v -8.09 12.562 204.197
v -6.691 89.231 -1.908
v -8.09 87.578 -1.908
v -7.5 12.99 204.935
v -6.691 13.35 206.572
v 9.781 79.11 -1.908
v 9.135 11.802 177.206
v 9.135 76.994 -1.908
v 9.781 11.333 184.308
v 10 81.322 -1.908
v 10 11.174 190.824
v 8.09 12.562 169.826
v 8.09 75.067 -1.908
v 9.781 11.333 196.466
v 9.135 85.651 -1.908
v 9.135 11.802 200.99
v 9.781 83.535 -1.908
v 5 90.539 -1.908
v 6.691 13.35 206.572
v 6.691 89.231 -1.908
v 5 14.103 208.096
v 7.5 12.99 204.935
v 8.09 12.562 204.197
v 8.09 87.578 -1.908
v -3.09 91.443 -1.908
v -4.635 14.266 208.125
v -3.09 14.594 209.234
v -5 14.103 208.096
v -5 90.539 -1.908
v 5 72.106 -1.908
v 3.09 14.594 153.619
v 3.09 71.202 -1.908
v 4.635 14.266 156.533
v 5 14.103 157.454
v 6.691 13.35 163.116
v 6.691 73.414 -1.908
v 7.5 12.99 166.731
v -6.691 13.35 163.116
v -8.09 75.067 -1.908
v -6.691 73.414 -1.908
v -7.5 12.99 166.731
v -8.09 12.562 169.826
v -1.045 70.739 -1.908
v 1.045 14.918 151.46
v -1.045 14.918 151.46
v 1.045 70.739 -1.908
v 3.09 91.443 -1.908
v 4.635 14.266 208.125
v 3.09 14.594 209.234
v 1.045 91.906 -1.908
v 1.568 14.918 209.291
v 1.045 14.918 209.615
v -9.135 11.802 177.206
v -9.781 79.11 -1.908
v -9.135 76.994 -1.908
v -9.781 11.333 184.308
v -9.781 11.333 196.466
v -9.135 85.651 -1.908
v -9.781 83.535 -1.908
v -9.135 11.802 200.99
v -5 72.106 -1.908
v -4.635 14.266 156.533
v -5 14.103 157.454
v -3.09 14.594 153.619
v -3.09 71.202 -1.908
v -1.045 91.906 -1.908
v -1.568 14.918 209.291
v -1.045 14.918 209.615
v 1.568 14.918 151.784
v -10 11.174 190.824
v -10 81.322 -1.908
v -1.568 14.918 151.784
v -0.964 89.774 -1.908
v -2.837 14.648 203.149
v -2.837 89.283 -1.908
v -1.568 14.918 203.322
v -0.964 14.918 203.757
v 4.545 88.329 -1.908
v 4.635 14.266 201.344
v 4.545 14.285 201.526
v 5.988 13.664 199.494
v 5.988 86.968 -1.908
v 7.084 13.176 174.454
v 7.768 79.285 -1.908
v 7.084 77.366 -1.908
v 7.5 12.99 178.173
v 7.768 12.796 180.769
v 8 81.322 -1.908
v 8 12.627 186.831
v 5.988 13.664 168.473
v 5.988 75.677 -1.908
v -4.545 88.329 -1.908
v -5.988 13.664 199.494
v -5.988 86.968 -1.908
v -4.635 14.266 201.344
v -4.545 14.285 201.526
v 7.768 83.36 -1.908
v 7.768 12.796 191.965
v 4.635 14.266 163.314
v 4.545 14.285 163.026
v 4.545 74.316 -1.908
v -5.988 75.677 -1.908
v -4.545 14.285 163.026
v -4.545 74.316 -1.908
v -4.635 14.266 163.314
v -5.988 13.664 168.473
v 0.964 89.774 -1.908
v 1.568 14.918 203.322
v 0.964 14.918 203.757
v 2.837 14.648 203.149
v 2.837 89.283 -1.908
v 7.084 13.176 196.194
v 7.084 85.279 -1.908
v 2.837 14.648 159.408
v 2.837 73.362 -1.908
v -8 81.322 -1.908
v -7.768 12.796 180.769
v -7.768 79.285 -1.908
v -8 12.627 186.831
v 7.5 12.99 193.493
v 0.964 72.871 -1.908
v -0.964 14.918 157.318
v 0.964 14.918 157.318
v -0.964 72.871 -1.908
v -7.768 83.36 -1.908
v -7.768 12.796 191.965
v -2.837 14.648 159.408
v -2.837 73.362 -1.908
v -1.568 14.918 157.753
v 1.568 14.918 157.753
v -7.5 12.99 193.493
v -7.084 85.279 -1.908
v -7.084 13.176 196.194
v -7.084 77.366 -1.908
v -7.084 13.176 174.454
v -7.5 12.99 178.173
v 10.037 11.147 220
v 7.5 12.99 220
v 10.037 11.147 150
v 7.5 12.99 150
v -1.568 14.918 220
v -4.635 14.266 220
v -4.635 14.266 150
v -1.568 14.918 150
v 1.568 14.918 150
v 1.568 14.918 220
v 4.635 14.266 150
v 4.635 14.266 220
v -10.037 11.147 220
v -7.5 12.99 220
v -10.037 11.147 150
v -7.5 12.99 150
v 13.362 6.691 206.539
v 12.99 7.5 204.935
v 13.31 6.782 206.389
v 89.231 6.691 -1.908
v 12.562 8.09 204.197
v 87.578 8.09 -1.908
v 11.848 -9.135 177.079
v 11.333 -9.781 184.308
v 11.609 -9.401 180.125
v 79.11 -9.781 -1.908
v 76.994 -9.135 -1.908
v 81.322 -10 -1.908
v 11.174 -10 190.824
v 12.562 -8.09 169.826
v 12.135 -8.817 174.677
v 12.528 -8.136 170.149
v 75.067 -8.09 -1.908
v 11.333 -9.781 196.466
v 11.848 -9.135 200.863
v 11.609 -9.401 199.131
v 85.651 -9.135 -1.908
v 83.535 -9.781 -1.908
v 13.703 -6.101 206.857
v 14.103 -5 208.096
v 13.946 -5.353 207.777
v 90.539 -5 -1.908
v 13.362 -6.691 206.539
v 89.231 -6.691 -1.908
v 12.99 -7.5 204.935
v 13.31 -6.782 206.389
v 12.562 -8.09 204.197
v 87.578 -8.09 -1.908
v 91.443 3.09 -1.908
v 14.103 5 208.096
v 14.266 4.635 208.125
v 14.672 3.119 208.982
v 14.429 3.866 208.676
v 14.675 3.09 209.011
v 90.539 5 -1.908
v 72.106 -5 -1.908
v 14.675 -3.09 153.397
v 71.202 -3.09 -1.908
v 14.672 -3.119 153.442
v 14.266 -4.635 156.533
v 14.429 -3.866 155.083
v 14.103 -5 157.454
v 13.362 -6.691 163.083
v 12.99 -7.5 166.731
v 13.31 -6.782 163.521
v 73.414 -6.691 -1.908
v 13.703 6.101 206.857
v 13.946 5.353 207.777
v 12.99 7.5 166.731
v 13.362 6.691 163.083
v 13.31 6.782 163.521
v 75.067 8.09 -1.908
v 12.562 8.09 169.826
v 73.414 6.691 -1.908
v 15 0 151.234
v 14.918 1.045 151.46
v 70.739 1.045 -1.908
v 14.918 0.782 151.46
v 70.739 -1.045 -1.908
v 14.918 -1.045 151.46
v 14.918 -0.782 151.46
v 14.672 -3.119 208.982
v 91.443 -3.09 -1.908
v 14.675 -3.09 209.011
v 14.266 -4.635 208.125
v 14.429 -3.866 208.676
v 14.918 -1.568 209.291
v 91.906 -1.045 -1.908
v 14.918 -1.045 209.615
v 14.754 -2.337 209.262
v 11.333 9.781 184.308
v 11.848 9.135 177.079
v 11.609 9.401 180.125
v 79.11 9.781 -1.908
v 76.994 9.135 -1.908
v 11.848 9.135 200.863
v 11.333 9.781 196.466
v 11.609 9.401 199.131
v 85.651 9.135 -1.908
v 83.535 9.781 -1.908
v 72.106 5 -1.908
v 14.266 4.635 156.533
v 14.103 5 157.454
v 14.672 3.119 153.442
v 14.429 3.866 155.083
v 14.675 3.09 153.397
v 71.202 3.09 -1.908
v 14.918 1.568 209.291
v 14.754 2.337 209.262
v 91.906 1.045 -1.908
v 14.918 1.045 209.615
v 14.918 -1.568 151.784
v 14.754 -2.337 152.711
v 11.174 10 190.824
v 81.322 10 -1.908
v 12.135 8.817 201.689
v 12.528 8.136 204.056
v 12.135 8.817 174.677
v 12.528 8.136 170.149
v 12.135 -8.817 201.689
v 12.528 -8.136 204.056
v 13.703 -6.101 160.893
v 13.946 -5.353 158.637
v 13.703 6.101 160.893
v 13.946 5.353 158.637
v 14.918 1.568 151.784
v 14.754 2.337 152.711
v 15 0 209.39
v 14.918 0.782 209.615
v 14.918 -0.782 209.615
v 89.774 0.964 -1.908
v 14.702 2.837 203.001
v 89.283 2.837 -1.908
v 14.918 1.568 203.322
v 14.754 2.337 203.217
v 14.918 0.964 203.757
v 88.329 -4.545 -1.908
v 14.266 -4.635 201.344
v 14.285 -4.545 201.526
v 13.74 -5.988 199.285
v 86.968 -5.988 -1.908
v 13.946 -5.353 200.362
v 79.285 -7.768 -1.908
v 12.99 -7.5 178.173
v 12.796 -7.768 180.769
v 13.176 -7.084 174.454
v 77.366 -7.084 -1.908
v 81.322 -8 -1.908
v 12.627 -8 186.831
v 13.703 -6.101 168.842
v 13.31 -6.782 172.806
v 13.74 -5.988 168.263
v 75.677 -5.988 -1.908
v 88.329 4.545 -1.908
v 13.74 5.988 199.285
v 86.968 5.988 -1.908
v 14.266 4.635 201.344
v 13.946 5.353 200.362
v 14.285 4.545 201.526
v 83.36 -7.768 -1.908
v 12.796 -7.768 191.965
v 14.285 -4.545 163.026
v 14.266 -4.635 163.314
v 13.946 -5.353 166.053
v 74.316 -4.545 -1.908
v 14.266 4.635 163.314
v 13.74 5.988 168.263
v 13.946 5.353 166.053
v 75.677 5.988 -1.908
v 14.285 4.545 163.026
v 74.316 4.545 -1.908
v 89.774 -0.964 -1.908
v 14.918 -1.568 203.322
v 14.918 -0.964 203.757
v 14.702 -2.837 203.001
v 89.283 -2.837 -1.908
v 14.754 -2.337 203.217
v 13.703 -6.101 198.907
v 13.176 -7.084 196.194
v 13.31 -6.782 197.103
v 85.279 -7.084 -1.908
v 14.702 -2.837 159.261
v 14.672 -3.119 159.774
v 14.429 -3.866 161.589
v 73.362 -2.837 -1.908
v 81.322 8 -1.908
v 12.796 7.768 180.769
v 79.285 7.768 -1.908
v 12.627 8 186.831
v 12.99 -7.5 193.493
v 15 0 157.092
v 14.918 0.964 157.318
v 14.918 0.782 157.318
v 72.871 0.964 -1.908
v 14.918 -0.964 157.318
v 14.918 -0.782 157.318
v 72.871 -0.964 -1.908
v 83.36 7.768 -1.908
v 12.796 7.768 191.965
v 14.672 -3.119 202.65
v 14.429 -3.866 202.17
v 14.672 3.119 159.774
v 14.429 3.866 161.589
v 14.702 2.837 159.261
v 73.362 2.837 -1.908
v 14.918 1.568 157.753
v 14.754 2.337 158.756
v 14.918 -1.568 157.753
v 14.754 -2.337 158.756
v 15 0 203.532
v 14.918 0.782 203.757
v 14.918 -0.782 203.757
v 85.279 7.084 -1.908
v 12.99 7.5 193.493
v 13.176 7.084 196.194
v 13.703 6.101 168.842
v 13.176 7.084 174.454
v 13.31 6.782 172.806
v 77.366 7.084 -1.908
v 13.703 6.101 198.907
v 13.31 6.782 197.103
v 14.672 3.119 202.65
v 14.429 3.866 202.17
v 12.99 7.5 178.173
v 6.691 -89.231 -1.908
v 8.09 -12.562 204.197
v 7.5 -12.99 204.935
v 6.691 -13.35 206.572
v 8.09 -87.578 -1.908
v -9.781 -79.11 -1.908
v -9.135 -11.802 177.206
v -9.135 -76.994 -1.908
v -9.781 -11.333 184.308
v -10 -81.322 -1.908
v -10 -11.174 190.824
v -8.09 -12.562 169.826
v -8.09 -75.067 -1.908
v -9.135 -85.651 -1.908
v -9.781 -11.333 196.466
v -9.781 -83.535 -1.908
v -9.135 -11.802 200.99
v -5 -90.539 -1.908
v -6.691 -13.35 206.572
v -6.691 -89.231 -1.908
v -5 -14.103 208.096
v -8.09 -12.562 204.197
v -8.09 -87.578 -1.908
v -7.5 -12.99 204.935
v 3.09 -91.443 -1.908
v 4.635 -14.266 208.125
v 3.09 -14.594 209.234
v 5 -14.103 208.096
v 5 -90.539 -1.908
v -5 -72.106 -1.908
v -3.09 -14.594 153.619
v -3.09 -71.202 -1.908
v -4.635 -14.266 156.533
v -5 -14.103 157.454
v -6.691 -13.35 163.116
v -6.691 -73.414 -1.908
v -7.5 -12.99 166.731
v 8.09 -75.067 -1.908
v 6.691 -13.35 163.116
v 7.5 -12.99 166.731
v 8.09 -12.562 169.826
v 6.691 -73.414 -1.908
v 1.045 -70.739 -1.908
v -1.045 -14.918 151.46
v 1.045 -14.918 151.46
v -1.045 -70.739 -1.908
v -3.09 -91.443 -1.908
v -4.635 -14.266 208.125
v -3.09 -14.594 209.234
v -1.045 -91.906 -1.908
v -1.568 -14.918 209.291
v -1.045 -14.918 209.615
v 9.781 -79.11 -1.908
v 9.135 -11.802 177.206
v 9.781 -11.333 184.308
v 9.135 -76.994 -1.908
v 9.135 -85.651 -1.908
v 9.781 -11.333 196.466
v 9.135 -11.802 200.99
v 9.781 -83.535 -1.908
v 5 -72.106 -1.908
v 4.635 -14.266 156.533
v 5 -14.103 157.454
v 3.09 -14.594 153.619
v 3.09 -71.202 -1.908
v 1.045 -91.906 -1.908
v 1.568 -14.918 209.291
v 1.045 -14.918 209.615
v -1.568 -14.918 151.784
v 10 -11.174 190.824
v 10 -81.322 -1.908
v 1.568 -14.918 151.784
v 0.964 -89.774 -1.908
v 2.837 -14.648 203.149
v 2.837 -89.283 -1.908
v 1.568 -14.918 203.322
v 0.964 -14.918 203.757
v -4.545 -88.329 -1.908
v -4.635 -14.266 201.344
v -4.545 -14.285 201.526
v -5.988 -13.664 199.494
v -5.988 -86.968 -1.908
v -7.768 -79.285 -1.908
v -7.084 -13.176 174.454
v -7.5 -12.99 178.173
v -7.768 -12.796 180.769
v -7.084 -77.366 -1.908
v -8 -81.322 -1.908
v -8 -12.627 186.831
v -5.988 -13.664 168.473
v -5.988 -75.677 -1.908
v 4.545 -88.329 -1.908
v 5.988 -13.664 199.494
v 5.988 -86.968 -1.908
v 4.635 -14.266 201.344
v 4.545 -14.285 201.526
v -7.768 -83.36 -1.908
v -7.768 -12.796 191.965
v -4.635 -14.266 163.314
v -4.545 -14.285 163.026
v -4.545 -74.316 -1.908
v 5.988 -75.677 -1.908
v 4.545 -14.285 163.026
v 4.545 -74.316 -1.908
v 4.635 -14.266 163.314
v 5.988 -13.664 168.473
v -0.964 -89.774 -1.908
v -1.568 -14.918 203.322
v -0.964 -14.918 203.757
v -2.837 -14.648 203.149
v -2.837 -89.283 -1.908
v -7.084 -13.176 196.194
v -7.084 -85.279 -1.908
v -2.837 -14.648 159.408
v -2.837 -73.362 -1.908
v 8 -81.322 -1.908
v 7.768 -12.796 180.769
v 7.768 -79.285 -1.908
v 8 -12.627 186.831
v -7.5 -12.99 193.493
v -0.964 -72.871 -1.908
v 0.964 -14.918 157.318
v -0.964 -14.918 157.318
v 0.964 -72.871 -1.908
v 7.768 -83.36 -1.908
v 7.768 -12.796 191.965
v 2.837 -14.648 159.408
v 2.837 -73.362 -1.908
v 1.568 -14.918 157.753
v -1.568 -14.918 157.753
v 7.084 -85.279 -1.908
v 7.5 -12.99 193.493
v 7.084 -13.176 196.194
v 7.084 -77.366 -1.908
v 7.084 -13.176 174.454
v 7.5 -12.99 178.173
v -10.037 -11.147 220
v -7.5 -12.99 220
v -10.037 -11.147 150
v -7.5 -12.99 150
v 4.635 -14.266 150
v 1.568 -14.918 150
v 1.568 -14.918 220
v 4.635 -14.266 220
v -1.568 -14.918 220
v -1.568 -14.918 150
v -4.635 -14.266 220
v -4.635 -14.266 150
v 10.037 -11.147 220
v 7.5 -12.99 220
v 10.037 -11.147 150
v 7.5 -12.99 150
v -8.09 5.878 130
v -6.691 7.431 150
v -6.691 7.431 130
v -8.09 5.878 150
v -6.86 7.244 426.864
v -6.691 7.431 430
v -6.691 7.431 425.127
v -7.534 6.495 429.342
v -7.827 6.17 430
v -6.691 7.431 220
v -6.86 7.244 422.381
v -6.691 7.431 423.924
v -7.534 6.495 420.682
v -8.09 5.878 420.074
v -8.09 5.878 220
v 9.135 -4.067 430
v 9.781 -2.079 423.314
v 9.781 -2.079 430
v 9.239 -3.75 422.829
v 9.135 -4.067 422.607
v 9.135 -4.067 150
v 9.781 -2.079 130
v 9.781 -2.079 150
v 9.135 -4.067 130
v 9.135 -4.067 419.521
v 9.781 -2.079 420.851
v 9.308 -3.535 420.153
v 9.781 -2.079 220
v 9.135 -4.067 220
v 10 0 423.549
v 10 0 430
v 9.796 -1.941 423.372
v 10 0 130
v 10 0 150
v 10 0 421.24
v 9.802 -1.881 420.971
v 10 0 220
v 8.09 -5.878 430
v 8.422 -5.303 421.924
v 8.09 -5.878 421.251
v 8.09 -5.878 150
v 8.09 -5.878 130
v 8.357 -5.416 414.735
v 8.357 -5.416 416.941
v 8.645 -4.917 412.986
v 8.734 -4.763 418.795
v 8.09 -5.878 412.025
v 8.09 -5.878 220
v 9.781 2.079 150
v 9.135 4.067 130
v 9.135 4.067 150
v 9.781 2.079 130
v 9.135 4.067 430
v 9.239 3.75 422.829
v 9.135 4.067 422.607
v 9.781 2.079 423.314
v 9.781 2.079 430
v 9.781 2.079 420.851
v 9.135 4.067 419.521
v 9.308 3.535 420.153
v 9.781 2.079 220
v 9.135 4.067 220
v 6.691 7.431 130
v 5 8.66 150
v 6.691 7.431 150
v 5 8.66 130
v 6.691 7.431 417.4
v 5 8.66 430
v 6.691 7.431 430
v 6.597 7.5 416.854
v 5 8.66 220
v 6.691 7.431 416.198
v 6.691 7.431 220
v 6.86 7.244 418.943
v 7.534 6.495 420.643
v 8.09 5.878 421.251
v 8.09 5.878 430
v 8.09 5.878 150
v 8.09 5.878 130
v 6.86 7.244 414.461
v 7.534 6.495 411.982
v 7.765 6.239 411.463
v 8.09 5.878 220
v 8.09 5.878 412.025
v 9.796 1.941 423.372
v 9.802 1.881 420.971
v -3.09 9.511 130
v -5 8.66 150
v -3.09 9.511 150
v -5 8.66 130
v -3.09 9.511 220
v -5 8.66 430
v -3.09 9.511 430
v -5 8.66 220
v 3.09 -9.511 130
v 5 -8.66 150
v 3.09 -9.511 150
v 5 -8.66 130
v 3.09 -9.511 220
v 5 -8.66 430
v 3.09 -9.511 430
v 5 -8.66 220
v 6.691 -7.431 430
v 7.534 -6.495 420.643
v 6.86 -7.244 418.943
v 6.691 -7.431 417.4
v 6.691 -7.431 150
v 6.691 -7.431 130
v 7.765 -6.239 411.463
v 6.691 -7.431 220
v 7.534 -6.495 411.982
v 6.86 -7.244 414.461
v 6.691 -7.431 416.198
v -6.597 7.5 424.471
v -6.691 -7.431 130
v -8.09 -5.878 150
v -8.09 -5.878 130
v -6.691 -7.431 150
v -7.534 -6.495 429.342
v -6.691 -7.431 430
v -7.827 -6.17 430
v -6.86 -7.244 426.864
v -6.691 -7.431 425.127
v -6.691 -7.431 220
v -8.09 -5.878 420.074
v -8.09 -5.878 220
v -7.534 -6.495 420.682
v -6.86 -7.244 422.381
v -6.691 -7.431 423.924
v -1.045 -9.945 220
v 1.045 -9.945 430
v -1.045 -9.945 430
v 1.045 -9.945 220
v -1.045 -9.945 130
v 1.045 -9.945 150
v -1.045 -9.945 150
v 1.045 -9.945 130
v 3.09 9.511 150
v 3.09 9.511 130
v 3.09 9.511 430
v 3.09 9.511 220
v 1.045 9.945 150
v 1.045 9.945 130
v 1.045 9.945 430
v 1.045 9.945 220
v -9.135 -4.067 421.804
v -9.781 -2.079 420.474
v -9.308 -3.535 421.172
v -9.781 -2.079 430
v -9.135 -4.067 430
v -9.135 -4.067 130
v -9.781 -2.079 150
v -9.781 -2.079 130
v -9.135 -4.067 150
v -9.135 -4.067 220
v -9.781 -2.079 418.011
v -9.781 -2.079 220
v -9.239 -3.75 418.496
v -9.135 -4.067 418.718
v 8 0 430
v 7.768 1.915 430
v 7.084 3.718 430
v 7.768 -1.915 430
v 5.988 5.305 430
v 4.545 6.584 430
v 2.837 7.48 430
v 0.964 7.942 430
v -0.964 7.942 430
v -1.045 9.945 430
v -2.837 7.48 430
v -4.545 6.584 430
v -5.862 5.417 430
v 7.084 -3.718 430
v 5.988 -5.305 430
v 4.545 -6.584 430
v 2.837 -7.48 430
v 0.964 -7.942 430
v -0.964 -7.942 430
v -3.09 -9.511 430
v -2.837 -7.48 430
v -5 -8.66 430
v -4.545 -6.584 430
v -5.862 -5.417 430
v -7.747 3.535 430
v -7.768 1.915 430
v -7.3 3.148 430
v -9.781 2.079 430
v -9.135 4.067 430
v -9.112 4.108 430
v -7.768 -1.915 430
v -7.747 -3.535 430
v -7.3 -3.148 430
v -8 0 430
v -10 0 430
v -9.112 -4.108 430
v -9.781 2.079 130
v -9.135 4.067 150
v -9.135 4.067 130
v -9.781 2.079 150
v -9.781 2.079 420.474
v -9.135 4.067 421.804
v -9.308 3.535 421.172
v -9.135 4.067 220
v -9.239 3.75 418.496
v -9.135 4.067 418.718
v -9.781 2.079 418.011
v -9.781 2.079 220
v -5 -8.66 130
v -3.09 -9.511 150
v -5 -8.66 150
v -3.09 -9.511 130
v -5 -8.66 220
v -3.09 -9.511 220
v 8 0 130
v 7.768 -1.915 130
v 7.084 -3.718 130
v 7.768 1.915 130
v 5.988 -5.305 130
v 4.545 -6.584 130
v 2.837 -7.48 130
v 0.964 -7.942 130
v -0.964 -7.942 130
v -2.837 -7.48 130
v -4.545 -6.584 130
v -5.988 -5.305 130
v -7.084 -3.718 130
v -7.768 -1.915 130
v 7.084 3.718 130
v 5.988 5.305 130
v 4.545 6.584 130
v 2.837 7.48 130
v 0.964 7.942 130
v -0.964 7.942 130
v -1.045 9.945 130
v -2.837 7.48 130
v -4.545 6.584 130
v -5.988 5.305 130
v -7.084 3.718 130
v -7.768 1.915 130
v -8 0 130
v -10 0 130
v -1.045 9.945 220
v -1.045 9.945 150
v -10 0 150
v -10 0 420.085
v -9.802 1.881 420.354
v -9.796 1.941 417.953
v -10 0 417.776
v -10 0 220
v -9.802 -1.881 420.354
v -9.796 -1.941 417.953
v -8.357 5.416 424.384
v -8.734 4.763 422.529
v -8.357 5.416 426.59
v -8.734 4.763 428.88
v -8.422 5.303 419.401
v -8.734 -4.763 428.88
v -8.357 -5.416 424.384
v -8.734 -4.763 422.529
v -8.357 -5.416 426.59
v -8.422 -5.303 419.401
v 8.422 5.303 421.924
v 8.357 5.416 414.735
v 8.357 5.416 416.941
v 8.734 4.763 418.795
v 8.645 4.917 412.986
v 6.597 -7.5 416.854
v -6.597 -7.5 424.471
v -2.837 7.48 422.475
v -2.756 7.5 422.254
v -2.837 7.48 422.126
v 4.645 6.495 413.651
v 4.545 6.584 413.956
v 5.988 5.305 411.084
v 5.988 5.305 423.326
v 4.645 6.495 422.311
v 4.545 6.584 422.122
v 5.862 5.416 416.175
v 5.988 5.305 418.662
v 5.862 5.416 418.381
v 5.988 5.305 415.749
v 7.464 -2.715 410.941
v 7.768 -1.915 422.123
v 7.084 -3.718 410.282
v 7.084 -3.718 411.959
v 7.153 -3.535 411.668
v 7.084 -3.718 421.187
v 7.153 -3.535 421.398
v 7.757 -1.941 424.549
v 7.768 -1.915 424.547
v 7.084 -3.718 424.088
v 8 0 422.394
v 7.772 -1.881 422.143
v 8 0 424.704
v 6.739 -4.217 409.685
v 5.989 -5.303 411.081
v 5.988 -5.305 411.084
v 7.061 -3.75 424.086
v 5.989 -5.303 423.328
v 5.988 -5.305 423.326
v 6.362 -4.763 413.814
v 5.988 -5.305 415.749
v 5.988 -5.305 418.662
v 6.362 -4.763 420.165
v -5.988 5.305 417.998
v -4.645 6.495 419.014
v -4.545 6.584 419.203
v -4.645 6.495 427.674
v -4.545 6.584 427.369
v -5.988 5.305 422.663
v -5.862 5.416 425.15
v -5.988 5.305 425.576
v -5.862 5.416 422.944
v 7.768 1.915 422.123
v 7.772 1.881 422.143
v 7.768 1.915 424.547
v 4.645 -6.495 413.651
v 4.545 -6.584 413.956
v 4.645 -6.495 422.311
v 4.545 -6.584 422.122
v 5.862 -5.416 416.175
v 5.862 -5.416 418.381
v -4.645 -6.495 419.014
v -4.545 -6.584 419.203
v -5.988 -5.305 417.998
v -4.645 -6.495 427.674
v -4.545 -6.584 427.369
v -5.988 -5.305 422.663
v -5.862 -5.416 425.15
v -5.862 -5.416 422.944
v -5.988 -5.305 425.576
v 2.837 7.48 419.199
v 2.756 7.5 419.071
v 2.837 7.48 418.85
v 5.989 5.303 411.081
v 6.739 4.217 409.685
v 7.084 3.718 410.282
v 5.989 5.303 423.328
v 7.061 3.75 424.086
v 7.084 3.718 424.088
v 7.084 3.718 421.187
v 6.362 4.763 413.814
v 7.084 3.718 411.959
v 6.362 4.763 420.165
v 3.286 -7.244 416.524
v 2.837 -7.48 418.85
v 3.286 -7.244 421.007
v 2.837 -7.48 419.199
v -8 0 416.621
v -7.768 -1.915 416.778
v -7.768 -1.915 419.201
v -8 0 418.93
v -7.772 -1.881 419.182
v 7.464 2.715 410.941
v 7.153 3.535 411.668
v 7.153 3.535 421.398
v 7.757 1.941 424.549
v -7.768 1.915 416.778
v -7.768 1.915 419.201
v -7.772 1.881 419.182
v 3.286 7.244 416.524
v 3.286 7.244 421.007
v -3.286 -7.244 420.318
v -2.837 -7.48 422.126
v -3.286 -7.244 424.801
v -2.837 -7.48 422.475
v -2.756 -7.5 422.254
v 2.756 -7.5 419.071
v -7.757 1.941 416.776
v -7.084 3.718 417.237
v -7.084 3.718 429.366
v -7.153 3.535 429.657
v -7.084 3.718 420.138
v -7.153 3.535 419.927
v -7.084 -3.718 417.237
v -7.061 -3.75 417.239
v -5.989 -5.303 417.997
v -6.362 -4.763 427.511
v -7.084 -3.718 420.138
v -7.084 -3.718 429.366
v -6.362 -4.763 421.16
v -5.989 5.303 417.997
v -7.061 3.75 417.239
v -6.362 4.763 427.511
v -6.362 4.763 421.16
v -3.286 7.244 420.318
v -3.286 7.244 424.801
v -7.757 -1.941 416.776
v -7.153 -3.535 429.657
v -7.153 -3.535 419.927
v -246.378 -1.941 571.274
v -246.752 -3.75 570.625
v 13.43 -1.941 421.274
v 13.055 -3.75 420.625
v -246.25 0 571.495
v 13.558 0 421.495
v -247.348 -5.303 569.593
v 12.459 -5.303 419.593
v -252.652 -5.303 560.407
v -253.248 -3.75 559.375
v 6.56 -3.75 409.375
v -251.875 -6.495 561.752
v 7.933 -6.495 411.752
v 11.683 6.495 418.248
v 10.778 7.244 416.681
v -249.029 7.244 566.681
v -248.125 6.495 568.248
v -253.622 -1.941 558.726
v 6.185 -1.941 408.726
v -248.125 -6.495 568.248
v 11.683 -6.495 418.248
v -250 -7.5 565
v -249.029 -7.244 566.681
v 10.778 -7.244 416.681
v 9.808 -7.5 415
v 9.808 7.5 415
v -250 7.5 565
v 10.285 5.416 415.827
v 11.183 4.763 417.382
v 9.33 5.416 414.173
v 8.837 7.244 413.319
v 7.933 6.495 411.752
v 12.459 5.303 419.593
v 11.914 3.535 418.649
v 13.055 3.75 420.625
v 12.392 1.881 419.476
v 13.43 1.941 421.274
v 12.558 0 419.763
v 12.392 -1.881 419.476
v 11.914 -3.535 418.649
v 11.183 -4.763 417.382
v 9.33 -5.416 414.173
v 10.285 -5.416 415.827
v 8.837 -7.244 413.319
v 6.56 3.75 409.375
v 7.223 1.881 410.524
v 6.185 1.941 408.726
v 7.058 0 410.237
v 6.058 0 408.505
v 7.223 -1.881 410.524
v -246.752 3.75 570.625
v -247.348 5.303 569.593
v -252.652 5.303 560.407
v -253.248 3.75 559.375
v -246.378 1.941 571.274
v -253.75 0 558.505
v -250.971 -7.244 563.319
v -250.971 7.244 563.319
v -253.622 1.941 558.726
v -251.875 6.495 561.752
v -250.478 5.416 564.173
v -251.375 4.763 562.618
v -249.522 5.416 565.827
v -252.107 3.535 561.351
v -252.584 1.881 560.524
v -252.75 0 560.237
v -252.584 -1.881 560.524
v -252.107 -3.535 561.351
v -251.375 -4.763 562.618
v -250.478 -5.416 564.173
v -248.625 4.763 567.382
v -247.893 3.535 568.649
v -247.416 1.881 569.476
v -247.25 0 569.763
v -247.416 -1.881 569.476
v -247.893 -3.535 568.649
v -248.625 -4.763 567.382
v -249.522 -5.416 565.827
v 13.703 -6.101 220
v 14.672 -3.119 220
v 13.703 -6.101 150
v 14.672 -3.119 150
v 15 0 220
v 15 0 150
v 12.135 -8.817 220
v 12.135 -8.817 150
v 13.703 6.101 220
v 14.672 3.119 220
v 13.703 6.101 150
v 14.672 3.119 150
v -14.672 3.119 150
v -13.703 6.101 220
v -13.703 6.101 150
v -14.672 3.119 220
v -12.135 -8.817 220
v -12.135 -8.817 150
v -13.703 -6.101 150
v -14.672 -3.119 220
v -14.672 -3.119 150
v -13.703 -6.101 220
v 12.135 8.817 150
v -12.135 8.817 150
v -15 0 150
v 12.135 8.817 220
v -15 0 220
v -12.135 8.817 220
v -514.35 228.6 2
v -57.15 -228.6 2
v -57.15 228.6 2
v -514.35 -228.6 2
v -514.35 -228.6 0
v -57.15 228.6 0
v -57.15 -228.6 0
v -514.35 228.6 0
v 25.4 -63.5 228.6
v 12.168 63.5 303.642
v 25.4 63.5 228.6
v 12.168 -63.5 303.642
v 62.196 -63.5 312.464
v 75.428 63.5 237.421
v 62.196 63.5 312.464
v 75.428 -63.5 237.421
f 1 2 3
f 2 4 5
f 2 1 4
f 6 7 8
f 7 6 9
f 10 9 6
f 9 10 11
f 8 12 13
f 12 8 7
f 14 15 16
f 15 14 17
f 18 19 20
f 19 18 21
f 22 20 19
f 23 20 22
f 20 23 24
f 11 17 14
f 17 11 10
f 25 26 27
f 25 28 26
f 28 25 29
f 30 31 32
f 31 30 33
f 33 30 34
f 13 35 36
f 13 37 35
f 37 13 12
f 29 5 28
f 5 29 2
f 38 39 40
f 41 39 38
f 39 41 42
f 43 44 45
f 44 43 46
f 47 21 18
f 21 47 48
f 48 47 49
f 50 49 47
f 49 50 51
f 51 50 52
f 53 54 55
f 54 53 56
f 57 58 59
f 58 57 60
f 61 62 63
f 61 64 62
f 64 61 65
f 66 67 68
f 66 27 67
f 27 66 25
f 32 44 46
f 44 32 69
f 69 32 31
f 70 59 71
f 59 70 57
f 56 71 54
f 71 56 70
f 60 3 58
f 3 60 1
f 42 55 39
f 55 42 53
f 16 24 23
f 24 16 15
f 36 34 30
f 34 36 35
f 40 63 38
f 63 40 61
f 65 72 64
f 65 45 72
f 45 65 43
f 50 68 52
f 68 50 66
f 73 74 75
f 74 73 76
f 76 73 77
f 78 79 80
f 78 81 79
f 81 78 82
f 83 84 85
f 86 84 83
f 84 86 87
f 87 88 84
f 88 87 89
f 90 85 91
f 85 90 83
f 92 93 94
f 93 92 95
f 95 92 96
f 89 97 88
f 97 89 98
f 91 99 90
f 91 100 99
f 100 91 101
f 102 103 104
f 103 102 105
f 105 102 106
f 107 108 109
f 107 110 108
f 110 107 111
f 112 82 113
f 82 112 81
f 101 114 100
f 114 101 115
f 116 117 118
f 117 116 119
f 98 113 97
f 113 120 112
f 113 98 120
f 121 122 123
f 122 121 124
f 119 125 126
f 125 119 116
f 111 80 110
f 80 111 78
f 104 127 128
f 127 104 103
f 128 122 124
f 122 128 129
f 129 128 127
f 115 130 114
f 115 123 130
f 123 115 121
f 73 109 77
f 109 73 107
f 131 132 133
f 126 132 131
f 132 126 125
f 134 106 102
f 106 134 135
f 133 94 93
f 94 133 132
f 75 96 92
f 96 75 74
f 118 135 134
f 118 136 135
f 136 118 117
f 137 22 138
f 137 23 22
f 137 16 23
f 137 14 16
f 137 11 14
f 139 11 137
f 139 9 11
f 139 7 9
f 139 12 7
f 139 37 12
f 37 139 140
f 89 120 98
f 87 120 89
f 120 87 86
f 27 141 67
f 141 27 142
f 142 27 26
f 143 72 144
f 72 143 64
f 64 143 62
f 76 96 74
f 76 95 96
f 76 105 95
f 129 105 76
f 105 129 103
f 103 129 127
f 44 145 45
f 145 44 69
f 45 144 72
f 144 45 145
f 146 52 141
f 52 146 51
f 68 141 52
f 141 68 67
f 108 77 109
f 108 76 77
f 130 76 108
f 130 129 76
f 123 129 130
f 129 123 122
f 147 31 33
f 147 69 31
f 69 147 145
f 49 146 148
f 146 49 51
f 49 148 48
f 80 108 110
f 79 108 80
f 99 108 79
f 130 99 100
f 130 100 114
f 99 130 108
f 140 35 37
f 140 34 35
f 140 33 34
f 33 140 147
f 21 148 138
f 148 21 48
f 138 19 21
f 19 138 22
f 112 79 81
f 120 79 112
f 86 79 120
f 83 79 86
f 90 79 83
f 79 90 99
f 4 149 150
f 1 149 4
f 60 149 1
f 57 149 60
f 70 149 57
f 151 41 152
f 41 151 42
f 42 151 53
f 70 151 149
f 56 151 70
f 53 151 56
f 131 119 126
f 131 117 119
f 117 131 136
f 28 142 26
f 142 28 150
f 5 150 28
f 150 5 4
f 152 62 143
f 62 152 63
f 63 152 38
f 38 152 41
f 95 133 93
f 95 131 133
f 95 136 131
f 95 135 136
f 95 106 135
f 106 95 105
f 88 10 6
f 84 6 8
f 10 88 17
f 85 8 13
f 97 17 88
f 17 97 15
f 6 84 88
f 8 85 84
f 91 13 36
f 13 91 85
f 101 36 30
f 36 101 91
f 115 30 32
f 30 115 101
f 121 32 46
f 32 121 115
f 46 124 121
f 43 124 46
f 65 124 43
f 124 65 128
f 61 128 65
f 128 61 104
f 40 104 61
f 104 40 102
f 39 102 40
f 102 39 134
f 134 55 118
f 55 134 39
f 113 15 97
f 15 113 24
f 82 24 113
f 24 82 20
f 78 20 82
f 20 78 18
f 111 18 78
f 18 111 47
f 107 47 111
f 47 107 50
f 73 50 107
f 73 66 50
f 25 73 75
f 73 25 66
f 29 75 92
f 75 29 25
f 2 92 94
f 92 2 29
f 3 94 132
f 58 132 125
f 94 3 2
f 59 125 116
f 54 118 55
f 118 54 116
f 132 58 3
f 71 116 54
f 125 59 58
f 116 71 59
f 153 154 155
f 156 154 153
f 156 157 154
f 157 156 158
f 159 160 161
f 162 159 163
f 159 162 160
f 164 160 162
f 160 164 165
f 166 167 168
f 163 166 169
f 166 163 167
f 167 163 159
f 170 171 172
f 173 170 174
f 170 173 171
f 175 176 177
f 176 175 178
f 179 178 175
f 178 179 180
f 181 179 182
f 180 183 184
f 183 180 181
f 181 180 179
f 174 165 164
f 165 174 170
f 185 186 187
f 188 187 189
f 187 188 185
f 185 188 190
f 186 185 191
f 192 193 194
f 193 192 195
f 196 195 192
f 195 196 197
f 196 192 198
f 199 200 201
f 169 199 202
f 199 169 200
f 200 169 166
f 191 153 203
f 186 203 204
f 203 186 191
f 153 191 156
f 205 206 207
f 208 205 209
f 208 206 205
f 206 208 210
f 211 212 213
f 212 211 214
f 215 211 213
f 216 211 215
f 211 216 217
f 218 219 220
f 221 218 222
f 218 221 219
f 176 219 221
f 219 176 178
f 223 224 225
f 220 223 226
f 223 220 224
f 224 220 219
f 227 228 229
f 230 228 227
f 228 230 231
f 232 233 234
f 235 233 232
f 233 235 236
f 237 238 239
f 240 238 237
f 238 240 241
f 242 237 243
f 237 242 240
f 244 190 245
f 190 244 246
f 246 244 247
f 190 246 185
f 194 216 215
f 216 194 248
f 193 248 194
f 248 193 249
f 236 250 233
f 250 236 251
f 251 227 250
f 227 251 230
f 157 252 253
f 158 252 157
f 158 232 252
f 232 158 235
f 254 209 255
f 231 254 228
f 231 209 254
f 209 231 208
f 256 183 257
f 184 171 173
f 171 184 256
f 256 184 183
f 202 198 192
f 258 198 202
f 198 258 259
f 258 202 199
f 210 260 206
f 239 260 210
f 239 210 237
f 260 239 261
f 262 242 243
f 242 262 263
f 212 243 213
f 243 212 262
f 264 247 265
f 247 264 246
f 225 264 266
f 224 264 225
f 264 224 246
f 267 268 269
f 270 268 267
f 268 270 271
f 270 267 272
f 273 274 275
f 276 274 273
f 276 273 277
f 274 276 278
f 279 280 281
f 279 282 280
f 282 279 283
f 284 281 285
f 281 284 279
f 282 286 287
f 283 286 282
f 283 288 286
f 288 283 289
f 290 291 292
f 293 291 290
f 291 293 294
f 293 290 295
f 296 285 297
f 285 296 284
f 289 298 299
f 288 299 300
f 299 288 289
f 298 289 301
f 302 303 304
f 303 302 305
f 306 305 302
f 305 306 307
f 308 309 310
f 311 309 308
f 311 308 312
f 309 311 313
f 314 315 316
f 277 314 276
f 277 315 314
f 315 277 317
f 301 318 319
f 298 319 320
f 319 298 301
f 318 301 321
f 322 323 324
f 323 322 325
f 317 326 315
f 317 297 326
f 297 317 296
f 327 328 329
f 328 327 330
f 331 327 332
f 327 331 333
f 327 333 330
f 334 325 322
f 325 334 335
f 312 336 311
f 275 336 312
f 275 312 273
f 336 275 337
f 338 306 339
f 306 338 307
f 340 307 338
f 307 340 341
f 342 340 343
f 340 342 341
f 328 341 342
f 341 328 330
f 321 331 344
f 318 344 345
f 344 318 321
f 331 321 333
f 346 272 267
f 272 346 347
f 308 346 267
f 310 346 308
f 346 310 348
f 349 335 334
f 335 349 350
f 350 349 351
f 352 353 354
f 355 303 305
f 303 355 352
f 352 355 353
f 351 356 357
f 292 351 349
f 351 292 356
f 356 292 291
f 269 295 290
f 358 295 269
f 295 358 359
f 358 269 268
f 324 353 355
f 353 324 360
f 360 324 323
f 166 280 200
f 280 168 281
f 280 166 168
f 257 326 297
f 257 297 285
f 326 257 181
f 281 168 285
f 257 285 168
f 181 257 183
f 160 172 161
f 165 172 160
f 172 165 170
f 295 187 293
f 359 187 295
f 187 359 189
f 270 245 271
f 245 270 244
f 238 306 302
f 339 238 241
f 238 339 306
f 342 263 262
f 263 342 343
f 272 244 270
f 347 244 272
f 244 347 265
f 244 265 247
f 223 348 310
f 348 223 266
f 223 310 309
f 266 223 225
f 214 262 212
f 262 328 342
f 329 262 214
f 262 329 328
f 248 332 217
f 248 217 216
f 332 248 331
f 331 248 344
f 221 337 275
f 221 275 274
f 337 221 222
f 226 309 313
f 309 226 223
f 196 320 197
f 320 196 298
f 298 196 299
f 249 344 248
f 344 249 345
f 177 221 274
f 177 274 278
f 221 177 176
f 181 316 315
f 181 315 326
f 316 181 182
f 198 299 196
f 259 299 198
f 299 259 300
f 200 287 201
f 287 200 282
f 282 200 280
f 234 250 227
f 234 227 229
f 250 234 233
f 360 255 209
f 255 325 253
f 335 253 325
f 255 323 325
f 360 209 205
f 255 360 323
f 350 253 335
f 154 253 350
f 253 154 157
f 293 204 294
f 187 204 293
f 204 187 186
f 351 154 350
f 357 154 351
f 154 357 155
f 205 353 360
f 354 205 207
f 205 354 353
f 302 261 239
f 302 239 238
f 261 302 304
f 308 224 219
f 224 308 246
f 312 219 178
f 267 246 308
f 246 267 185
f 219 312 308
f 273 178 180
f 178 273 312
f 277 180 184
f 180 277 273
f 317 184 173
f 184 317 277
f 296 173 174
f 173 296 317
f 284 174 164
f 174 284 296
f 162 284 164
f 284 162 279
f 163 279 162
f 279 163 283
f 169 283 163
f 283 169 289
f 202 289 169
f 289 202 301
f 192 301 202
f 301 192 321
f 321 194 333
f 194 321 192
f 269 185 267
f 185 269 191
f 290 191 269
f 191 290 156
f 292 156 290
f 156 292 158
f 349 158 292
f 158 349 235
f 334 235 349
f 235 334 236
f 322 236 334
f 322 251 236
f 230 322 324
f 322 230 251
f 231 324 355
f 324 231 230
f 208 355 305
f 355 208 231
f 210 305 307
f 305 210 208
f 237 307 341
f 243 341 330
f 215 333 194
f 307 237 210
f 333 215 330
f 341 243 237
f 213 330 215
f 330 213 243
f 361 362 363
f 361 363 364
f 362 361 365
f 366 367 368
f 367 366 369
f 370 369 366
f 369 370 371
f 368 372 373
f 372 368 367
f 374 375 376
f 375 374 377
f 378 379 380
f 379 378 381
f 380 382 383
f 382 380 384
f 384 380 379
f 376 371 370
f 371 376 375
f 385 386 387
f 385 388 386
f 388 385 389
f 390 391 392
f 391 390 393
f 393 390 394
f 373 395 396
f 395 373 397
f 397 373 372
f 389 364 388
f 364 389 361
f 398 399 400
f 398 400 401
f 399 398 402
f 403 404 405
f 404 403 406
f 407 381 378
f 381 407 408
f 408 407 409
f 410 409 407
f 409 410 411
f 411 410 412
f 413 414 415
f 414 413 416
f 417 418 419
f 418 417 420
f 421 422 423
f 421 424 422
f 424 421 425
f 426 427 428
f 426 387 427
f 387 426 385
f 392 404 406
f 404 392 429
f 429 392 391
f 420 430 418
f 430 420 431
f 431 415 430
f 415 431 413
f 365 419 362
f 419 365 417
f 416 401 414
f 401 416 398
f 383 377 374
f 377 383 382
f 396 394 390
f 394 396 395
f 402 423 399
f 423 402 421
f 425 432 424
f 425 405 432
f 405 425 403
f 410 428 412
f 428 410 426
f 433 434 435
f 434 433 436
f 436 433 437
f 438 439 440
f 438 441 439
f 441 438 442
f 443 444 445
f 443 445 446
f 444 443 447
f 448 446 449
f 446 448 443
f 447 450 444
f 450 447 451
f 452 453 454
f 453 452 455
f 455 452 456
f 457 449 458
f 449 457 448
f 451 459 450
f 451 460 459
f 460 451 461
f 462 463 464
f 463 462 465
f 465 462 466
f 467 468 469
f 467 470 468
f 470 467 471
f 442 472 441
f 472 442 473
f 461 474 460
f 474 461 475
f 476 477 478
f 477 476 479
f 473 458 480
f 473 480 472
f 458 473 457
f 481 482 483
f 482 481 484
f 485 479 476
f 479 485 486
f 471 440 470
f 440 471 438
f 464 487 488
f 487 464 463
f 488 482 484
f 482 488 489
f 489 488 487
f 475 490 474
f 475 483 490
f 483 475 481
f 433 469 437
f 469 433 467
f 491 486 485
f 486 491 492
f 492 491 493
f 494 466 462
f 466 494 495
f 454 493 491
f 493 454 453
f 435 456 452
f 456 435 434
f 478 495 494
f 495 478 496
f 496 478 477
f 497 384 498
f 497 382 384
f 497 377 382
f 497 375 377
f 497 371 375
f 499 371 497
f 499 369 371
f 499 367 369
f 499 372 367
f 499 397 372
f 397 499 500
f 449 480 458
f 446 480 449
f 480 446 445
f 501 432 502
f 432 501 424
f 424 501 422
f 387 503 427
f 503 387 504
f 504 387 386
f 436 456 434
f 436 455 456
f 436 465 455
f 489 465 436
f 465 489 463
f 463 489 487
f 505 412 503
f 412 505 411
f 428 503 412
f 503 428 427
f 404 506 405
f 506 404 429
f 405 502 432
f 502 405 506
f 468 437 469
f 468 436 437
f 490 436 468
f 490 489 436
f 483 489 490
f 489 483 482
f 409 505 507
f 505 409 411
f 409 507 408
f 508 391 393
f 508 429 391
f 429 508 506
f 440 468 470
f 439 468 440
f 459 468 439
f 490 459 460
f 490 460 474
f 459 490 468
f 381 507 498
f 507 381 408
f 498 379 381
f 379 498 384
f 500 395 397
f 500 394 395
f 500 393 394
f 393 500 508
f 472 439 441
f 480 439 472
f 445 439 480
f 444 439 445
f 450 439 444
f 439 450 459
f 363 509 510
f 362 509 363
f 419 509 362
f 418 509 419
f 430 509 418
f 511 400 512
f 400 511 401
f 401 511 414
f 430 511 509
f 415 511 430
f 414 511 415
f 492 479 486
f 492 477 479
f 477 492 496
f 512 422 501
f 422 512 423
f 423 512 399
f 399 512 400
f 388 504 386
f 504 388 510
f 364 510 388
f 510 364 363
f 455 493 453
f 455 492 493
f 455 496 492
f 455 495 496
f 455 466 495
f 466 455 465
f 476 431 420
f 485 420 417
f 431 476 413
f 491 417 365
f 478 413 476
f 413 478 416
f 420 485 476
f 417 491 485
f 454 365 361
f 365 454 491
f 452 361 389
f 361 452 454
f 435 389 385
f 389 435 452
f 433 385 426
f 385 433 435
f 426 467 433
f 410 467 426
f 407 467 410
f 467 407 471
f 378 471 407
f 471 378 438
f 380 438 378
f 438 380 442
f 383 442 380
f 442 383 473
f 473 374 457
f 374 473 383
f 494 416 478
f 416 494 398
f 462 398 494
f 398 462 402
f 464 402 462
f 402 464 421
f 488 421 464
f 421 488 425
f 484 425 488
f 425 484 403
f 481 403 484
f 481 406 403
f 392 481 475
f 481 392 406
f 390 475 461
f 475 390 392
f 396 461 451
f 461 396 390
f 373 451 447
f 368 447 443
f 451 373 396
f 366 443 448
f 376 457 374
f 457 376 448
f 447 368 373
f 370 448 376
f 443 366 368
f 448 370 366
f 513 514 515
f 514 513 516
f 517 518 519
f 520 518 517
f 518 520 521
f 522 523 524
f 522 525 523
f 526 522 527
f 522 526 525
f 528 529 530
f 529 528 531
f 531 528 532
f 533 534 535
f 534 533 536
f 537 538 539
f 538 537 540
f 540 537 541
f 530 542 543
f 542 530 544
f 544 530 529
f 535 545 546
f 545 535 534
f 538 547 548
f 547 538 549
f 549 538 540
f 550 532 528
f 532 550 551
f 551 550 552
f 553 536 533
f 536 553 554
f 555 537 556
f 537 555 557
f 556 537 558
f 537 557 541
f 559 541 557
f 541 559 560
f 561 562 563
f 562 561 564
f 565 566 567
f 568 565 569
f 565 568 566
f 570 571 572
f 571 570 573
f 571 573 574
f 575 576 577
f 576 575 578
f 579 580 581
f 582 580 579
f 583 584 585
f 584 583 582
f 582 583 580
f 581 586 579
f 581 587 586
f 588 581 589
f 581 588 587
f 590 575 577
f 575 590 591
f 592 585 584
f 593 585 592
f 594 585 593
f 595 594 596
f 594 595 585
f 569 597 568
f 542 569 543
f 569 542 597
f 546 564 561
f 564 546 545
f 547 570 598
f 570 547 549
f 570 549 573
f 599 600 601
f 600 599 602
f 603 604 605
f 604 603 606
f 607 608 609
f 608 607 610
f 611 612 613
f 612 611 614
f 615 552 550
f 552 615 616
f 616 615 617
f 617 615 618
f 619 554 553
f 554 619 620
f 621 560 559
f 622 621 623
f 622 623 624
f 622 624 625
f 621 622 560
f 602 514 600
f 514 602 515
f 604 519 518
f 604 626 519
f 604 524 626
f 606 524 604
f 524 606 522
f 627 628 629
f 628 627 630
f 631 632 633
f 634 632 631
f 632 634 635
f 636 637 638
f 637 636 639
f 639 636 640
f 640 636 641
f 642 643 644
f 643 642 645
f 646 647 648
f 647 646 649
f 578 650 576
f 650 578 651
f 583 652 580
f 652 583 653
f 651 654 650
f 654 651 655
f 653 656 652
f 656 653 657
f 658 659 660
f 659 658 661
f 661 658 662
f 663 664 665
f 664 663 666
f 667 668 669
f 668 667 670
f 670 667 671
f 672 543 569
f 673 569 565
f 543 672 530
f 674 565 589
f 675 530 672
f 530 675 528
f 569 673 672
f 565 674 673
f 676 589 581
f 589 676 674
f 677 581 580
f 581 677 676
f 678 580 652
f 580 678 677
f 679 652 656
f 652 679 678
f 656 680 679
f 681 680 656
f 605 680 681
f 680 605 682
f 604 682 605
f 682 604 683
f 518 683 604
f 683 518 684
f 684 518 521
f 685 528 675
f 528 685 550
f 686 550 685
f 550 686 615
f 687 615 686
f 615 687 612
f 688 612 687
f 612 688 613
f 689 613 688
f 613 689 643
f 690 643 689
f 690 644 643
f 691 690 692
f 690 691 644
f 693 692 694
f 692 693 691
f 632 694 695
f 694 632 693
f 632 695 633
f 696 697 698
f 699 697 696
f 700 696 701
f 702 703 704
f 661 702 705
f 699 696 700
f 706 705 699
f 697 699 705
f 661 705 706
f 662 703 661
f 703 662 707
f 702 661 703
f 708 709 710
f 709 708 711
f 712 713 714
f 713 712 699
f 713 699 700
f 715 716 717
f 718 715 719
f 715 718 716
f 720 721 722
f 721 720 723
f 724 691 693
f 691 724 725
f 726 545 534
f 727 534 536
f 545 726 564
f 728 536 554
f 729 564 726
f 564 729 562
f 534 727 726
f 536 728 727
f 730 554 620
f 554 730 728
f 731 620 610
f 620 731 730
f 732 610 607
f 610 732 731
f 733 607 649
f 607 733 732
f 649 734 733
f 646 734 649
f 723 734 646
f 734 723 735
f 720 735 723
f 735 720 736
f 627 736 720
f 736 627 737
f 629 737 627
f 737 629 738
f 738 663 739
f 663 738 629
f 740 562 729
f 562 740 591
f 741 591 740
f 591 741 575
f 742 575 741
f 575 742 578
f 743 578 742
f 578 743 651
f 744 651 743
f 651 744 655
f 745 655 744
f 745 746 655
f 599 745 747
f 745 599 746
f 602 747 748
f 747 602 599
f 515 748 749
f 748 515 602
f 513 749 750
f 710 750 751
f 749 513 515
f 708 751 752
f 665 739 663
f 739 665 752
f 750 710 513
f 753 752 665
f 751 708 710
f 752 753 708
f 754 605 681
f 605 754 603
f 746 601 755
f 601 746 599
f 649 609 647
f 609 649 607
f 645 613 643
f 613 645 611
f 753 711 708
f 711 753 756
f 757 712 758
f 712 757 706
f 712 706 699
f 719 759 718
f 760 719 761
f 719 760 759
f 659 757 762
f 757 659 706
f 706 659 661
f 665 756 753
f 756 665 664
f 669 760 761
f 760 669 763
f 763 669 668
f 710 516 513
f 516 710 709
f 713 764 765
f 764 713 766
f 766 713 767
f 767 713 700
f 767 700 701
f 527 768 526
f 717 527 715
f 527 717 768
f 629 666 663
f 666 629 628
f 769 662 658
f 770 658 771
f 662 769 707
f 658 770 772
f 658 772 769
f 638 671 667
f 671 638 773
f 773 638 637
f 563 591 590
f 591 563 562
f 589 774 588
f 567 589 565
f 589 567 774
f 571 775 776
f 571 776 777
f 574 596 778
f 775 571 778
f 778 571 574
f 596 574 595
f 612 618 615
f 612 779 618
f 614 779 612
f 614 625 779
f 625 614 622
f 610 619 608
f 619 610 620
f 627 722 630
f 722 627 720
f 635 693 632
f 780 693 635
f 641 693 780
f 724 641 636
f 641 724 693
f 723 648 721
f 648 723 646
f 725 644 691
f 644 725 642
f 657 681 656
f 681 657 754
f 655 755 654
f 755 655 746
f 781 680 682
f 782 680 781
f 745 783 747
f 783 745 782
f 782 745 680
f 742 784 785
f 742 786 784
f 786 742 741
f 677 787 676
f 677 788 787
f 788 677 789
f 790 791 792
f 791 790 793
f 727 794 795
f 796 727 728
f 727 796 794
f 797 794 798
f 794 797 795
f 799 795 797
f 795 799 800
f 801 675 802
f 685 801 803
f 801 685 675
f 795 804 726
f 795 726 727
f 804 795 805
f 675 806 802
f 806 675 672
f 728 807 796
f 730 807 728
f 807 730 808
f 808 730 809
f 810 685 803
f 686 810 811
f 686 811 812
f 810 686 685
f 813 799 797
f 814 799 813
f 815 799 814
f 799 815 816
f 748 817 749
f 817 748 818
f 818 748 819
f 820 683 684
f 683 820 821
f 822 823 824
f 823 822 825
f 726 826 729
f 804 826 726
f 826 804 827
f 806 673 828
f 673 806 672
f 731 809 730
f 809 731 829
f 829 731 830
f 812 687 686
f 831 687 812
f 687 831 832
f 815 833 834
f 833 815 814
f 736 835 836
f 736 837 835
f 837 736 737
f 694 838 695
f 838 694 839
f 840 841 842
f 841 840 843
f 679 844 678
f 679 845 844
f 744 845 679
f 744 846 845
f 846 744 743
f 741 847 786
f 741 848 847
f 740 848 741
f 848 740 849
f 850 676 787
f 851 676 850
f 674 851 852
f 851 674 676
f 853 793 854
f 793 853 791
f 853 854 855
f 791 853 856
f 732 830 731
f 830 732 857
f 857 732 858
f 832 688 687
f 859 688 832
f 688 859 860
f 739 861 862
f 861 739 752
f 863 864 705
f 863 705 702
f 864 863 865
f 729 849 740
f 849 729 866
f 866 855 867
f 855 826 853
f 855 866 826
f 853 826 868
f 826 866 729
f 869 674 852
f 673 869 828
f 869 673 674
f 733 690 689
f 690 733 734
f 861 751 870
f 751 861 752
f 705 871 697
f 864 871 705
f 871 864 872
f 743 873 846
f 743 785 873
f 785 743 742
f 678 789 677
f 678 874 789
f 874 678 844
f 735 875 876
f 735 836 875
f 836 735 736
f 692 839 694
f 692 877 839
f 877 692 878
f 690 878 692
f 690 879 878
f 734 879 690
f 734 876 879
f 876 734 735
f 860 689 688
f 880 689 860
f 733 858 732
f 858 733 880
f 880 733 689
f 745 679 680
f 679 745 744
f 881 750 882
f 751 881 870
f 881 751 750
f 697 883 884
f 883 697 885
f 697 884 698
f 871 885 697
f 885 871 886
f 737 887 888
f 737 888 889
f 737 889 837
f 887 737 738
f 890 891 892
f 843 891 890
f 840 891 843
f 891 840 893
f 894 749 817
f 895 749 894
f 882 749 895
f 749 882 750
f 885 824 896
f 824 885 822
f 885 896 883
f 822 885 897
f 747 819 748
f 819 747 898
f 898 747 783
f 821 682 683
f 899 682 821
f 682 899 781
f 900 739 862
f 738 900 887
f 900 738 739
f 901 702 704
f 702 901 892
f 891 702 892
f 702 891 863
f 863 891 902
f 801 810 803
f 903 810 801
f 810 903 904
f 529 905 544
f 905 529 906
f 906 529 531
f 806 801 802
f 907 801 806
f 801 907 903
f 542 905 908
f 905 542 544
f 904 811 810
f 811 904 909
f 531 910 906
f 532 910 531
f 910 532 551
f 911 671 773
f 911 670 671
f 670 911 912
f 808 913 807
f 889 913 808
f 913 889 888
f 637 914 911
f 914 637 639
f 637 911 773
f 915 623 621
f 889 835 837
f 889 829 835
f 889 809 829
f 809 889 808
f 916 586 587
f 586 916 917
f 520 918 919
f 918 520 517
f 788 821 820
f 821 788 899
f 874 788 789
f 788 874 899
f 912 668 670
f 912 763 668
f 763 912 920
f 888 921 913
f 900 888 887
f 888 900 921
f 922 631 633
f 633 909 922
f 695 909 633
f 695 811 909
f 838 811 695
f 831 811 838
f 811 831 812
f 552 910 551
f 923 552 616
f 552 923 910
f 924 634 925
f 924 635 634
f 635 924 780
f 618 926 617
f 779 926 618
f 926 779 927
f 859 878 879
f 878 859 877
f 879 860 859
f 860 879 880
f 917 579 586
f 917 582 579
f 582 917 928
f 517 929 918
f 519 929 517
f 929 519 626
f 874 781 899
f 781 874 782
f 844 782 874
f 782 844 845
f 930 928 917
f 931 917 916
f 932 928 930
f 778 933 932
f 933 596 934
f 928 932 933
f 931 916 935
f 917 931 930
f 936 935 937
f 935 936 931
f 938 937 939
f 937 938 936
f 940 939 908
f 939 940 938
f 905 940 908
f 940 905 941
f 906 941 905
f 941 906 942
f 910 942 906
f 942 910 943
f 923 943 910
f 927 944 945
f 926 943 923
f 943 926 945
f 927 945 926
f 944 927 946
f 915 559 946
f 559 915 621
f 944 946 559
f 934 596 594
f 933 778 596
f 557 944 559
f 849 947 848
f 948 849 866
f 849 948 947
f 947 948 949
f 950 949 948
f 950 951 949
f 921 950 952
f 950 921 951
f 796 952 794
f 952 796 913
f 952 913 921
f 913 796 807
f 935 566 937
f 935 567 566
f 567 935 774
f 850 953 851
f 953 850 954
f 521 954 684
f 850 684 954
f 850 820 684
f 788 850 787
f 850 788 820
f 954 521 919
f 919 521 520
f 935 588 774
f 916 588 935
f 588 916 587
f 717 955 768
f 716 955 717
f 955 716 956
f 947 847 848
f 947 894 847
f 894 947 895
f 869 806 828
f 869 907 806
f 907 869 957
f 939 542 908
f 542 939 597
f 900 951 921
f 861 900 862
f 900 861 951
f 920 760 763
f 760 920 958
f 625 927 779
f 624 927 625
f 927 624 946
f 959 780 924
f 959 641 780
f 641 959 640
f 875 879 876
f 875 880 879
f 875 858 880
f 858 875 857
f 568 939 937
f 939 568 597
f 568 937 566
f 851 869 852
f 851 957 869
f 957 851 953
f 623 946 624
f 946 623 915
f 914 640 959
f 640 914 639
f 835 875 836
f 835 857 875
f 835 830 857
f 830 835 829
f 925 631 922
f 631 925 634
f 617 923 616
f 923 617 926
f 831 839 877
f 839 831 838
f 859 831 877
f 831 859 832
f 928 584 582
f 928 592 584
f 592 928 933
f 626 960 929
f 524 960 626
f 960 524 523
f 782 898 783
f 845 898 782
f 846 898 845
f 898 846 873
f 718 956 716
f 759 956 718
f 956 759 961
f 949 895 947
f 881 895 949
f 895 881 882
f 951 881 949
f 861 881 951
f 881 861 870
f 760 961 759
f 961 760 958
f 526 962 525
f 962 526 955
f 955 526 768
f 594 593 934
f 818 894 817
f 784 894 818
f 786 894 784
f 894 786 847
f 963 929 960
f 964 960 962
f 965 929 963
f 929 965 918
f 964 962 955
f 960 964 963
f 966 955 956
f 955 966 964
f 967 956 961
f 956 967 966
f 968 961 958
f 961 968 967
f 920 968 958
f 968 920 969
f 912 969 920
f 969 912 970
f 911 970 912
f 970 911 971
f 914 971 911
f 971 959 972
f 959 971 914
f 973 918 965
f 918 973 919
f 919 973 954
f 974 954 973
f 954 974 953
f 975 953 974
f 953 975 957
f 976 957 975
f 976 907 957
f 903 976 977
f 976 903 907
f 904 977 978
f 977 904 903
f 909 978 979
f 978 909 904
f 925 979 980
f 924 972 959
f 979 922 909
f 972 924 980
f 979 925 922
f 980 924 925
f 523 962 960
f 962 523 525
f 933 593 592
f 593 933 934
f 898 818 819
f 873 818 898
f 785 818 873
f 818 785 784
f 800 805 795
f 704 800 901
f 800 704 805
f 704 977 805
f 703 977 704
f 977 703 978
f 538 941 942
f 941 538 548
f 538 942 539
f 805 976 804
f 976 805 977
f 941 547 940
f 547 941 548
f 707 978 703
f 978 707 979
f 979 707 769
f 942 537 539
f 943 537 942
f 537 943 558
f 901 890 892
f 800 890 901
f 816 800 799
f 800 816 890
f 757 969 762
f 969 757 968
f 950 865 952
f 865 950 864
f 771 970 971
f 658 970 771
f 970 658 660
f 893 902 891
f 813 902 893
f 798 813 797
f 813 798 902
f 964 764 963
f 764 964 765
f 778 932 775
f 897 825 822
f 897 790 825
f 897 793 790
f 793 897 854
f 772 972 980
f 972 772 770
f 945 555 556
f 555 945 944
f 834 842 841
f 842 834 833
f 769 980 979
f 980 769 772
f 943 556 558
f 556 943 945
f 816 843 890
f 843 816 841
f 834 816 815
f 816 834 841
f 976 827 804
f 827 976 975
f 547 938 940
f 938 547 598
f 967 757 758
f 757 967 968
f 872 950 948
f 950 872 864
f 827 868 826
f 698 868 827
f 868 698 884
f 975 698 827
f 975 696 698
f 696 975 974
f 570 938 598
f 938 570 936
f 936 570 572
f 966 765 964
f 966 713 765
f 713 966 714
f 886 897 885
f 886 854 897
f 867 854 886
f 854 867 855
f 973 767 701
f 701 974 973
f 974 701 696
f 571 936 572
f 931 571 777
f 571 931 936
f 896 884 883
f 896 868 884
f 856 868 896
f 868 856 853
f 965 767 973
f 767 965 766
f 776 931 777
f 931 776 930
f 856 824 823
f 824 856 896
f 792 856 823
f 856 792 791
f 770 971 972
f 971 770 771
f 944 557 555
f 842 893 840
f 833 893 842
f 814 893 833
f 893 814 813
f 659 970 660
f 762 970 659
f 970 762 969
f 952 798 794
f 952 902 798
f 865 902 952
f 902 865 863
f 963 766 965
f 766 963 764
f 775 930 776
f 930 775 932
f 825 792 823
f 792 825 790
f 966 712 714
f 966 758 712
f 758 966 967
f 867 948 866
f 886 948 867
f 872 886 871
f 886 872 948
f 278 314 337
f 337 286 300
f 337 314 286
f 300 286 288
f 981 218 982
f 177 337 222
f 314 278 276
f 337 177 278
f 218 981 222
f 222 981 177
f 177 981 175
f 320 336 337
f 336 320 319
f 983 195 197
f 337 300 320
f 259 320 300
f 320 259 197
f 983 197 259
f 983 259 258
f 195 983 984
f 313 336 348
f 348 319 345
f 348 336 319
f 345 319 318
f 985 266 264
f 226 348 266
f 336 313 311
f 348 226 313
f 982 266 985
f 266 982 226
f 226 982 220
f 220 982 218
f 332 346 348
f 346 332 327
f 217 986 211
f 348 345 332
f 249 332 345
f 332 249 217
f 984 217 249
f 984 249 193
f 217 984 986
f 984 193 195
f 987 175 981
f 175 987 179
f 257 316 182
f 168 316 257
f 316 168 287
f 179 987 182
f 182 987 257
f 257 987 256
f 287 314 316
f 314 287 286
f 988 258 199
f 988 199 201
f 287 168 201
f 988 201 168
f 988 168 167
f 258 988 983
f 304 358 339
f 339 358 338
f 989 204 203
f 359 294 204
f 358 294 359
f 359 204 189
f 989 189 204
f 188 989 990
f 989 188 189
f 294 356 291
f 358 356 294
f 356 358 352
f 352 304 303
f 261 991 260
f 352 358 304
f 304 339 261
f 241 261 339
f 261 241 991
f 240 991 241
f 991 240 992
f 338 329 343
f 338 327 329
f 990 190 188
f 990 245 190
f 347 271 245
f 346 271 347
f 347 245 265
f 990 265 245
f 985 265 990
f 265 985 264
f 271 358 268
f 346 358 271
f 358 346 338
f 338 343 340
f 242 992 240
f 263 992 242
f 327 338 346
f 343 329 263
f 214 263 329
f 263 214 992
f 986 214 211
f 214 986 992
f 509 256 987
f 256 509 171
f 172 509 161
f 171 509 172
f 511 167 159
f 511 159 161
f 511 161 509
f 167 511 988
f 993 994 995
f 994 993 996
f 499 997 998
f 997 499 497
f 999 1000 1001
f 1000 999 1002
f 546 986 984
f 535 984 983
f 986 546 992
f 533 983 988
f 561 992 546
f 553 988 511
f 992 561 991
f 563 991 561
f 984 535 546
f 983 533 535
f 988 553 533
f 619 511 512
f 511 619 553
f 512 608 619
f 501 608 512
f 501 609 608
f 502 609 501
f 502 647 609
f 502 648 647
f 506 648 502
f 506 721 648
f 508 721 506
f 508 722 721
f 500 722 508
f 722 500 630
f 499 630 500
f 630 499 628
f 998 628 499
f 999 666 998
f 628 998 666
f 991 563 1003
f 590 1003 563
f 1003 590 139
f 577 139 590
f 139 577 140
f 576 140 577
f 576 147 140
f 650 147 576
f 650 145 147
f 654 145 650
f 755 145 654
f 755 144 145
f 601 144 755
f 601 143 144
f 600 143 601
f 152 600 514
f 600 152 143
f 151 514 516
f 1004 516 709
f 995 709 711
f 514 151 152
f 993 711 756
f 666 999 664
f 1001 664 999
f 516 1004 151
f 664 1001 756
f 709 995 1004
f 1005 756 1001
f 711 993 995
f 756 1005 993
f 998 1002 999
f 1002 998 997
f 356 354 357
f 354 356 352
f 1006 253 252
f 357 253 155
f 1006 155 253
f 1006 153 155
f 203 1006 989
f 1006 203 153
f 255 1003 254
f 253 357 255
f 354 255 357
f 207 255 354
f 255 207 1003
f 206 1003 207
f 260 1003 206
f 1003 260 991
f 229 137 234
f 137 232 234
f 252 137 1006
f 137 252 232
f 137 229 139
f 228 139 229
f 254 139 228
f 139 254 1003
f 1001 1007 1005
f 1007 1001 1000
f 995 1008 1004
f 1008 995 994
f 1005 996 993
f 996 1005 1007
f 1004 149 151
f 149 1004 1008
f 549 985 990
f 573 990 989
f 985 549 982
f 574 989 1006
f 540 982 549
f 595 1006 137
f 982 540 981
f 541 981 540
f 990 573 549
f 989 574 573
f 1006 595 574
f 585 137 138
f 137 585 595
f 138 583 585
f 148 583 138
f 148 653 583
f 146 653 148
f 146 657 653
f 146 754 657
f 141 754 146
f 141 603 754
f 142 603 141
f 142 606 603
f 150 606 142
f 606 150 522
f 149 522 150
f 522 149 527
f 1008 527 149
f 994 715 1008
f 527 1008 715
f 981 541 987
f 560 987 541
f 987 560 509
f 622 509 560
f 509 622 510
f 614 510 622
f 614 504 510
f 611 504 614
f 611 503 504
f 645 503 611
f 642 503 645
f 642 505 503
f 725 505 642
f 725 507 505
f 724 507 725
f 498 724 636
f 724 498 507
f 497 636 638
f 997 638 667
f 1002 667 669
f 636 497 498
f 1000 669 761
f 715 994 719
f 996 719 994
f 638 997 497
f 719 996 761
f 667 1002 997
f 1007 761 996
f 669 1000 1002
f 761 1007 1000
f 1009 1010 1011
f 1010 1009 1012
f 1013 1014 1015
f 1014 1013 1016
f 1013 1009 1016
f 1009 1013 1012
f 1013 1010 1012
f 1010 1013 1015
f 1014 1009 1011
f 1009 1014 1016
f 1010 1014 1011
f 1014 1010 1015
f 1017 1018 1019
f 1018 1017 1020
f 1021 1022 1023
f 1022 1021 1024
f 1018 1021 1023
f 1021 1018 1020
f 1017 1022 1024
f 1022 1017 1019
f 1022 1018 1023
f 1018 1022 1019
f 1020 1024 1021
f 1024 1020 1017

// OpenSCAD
module tube(od, id, h){
  difference(){
    color([1, .3, .6])cylinder(d=od, h=h);
    translate([0, 0, -1])cylinder(d=id, h=h + 2);
  }
}

OD = 20;
ID = 16;
angle = 20;


module leg(){
  color([.5, .1, 1])translate([0, 0 ,-90]){
    difference(){
      rotate([angle, 0, 0])translate([0, OD, 0])tube(OD, ID, 300);
      cylinder(h=1000, d=OD + 10);
      translate([-50, 0, 0])cube(100);
      translate([-100, -100, 300 * cos(angle)])cube(200);
    }
  }
}

module tripod(){
  leg();
  rotate([0, 0, 90]) leg();
  rotate([0, 0, 180]) leg();
  translate([0, 0, -240])tube(OD, ID, 300);
  translate([-250, 0, -375])rotate([0, 60, 0])tube(OD-5, ID-5, 300);
  color([.5, .5, .5])translate([0, 0, -30])tube(OD+10, ID+4, 70);
}

rotate([180, 0, 0])translate([0, 0, -190])tripod();
module board(square){
  for(i=[0:7]){
    for(j=[0:7]){
      if((i + j) % 2 == 1){
	color("grey")translate([i * square, j * square, 0])cube([square, square, 2]);
      }
      else{
	color("lightgrey")translate([i * square, j * square, 0])cube([square, square, 2]);
      }
    }
  }
}

inch = 25.4;
square = 2.25 * inch;
translate([-9, -4, 0] * square)board(2.25 * inch);

translate([1., -2.5, 9] * inch)rotate([0, -10, 0])cube([2, 5, 3] * inch);
